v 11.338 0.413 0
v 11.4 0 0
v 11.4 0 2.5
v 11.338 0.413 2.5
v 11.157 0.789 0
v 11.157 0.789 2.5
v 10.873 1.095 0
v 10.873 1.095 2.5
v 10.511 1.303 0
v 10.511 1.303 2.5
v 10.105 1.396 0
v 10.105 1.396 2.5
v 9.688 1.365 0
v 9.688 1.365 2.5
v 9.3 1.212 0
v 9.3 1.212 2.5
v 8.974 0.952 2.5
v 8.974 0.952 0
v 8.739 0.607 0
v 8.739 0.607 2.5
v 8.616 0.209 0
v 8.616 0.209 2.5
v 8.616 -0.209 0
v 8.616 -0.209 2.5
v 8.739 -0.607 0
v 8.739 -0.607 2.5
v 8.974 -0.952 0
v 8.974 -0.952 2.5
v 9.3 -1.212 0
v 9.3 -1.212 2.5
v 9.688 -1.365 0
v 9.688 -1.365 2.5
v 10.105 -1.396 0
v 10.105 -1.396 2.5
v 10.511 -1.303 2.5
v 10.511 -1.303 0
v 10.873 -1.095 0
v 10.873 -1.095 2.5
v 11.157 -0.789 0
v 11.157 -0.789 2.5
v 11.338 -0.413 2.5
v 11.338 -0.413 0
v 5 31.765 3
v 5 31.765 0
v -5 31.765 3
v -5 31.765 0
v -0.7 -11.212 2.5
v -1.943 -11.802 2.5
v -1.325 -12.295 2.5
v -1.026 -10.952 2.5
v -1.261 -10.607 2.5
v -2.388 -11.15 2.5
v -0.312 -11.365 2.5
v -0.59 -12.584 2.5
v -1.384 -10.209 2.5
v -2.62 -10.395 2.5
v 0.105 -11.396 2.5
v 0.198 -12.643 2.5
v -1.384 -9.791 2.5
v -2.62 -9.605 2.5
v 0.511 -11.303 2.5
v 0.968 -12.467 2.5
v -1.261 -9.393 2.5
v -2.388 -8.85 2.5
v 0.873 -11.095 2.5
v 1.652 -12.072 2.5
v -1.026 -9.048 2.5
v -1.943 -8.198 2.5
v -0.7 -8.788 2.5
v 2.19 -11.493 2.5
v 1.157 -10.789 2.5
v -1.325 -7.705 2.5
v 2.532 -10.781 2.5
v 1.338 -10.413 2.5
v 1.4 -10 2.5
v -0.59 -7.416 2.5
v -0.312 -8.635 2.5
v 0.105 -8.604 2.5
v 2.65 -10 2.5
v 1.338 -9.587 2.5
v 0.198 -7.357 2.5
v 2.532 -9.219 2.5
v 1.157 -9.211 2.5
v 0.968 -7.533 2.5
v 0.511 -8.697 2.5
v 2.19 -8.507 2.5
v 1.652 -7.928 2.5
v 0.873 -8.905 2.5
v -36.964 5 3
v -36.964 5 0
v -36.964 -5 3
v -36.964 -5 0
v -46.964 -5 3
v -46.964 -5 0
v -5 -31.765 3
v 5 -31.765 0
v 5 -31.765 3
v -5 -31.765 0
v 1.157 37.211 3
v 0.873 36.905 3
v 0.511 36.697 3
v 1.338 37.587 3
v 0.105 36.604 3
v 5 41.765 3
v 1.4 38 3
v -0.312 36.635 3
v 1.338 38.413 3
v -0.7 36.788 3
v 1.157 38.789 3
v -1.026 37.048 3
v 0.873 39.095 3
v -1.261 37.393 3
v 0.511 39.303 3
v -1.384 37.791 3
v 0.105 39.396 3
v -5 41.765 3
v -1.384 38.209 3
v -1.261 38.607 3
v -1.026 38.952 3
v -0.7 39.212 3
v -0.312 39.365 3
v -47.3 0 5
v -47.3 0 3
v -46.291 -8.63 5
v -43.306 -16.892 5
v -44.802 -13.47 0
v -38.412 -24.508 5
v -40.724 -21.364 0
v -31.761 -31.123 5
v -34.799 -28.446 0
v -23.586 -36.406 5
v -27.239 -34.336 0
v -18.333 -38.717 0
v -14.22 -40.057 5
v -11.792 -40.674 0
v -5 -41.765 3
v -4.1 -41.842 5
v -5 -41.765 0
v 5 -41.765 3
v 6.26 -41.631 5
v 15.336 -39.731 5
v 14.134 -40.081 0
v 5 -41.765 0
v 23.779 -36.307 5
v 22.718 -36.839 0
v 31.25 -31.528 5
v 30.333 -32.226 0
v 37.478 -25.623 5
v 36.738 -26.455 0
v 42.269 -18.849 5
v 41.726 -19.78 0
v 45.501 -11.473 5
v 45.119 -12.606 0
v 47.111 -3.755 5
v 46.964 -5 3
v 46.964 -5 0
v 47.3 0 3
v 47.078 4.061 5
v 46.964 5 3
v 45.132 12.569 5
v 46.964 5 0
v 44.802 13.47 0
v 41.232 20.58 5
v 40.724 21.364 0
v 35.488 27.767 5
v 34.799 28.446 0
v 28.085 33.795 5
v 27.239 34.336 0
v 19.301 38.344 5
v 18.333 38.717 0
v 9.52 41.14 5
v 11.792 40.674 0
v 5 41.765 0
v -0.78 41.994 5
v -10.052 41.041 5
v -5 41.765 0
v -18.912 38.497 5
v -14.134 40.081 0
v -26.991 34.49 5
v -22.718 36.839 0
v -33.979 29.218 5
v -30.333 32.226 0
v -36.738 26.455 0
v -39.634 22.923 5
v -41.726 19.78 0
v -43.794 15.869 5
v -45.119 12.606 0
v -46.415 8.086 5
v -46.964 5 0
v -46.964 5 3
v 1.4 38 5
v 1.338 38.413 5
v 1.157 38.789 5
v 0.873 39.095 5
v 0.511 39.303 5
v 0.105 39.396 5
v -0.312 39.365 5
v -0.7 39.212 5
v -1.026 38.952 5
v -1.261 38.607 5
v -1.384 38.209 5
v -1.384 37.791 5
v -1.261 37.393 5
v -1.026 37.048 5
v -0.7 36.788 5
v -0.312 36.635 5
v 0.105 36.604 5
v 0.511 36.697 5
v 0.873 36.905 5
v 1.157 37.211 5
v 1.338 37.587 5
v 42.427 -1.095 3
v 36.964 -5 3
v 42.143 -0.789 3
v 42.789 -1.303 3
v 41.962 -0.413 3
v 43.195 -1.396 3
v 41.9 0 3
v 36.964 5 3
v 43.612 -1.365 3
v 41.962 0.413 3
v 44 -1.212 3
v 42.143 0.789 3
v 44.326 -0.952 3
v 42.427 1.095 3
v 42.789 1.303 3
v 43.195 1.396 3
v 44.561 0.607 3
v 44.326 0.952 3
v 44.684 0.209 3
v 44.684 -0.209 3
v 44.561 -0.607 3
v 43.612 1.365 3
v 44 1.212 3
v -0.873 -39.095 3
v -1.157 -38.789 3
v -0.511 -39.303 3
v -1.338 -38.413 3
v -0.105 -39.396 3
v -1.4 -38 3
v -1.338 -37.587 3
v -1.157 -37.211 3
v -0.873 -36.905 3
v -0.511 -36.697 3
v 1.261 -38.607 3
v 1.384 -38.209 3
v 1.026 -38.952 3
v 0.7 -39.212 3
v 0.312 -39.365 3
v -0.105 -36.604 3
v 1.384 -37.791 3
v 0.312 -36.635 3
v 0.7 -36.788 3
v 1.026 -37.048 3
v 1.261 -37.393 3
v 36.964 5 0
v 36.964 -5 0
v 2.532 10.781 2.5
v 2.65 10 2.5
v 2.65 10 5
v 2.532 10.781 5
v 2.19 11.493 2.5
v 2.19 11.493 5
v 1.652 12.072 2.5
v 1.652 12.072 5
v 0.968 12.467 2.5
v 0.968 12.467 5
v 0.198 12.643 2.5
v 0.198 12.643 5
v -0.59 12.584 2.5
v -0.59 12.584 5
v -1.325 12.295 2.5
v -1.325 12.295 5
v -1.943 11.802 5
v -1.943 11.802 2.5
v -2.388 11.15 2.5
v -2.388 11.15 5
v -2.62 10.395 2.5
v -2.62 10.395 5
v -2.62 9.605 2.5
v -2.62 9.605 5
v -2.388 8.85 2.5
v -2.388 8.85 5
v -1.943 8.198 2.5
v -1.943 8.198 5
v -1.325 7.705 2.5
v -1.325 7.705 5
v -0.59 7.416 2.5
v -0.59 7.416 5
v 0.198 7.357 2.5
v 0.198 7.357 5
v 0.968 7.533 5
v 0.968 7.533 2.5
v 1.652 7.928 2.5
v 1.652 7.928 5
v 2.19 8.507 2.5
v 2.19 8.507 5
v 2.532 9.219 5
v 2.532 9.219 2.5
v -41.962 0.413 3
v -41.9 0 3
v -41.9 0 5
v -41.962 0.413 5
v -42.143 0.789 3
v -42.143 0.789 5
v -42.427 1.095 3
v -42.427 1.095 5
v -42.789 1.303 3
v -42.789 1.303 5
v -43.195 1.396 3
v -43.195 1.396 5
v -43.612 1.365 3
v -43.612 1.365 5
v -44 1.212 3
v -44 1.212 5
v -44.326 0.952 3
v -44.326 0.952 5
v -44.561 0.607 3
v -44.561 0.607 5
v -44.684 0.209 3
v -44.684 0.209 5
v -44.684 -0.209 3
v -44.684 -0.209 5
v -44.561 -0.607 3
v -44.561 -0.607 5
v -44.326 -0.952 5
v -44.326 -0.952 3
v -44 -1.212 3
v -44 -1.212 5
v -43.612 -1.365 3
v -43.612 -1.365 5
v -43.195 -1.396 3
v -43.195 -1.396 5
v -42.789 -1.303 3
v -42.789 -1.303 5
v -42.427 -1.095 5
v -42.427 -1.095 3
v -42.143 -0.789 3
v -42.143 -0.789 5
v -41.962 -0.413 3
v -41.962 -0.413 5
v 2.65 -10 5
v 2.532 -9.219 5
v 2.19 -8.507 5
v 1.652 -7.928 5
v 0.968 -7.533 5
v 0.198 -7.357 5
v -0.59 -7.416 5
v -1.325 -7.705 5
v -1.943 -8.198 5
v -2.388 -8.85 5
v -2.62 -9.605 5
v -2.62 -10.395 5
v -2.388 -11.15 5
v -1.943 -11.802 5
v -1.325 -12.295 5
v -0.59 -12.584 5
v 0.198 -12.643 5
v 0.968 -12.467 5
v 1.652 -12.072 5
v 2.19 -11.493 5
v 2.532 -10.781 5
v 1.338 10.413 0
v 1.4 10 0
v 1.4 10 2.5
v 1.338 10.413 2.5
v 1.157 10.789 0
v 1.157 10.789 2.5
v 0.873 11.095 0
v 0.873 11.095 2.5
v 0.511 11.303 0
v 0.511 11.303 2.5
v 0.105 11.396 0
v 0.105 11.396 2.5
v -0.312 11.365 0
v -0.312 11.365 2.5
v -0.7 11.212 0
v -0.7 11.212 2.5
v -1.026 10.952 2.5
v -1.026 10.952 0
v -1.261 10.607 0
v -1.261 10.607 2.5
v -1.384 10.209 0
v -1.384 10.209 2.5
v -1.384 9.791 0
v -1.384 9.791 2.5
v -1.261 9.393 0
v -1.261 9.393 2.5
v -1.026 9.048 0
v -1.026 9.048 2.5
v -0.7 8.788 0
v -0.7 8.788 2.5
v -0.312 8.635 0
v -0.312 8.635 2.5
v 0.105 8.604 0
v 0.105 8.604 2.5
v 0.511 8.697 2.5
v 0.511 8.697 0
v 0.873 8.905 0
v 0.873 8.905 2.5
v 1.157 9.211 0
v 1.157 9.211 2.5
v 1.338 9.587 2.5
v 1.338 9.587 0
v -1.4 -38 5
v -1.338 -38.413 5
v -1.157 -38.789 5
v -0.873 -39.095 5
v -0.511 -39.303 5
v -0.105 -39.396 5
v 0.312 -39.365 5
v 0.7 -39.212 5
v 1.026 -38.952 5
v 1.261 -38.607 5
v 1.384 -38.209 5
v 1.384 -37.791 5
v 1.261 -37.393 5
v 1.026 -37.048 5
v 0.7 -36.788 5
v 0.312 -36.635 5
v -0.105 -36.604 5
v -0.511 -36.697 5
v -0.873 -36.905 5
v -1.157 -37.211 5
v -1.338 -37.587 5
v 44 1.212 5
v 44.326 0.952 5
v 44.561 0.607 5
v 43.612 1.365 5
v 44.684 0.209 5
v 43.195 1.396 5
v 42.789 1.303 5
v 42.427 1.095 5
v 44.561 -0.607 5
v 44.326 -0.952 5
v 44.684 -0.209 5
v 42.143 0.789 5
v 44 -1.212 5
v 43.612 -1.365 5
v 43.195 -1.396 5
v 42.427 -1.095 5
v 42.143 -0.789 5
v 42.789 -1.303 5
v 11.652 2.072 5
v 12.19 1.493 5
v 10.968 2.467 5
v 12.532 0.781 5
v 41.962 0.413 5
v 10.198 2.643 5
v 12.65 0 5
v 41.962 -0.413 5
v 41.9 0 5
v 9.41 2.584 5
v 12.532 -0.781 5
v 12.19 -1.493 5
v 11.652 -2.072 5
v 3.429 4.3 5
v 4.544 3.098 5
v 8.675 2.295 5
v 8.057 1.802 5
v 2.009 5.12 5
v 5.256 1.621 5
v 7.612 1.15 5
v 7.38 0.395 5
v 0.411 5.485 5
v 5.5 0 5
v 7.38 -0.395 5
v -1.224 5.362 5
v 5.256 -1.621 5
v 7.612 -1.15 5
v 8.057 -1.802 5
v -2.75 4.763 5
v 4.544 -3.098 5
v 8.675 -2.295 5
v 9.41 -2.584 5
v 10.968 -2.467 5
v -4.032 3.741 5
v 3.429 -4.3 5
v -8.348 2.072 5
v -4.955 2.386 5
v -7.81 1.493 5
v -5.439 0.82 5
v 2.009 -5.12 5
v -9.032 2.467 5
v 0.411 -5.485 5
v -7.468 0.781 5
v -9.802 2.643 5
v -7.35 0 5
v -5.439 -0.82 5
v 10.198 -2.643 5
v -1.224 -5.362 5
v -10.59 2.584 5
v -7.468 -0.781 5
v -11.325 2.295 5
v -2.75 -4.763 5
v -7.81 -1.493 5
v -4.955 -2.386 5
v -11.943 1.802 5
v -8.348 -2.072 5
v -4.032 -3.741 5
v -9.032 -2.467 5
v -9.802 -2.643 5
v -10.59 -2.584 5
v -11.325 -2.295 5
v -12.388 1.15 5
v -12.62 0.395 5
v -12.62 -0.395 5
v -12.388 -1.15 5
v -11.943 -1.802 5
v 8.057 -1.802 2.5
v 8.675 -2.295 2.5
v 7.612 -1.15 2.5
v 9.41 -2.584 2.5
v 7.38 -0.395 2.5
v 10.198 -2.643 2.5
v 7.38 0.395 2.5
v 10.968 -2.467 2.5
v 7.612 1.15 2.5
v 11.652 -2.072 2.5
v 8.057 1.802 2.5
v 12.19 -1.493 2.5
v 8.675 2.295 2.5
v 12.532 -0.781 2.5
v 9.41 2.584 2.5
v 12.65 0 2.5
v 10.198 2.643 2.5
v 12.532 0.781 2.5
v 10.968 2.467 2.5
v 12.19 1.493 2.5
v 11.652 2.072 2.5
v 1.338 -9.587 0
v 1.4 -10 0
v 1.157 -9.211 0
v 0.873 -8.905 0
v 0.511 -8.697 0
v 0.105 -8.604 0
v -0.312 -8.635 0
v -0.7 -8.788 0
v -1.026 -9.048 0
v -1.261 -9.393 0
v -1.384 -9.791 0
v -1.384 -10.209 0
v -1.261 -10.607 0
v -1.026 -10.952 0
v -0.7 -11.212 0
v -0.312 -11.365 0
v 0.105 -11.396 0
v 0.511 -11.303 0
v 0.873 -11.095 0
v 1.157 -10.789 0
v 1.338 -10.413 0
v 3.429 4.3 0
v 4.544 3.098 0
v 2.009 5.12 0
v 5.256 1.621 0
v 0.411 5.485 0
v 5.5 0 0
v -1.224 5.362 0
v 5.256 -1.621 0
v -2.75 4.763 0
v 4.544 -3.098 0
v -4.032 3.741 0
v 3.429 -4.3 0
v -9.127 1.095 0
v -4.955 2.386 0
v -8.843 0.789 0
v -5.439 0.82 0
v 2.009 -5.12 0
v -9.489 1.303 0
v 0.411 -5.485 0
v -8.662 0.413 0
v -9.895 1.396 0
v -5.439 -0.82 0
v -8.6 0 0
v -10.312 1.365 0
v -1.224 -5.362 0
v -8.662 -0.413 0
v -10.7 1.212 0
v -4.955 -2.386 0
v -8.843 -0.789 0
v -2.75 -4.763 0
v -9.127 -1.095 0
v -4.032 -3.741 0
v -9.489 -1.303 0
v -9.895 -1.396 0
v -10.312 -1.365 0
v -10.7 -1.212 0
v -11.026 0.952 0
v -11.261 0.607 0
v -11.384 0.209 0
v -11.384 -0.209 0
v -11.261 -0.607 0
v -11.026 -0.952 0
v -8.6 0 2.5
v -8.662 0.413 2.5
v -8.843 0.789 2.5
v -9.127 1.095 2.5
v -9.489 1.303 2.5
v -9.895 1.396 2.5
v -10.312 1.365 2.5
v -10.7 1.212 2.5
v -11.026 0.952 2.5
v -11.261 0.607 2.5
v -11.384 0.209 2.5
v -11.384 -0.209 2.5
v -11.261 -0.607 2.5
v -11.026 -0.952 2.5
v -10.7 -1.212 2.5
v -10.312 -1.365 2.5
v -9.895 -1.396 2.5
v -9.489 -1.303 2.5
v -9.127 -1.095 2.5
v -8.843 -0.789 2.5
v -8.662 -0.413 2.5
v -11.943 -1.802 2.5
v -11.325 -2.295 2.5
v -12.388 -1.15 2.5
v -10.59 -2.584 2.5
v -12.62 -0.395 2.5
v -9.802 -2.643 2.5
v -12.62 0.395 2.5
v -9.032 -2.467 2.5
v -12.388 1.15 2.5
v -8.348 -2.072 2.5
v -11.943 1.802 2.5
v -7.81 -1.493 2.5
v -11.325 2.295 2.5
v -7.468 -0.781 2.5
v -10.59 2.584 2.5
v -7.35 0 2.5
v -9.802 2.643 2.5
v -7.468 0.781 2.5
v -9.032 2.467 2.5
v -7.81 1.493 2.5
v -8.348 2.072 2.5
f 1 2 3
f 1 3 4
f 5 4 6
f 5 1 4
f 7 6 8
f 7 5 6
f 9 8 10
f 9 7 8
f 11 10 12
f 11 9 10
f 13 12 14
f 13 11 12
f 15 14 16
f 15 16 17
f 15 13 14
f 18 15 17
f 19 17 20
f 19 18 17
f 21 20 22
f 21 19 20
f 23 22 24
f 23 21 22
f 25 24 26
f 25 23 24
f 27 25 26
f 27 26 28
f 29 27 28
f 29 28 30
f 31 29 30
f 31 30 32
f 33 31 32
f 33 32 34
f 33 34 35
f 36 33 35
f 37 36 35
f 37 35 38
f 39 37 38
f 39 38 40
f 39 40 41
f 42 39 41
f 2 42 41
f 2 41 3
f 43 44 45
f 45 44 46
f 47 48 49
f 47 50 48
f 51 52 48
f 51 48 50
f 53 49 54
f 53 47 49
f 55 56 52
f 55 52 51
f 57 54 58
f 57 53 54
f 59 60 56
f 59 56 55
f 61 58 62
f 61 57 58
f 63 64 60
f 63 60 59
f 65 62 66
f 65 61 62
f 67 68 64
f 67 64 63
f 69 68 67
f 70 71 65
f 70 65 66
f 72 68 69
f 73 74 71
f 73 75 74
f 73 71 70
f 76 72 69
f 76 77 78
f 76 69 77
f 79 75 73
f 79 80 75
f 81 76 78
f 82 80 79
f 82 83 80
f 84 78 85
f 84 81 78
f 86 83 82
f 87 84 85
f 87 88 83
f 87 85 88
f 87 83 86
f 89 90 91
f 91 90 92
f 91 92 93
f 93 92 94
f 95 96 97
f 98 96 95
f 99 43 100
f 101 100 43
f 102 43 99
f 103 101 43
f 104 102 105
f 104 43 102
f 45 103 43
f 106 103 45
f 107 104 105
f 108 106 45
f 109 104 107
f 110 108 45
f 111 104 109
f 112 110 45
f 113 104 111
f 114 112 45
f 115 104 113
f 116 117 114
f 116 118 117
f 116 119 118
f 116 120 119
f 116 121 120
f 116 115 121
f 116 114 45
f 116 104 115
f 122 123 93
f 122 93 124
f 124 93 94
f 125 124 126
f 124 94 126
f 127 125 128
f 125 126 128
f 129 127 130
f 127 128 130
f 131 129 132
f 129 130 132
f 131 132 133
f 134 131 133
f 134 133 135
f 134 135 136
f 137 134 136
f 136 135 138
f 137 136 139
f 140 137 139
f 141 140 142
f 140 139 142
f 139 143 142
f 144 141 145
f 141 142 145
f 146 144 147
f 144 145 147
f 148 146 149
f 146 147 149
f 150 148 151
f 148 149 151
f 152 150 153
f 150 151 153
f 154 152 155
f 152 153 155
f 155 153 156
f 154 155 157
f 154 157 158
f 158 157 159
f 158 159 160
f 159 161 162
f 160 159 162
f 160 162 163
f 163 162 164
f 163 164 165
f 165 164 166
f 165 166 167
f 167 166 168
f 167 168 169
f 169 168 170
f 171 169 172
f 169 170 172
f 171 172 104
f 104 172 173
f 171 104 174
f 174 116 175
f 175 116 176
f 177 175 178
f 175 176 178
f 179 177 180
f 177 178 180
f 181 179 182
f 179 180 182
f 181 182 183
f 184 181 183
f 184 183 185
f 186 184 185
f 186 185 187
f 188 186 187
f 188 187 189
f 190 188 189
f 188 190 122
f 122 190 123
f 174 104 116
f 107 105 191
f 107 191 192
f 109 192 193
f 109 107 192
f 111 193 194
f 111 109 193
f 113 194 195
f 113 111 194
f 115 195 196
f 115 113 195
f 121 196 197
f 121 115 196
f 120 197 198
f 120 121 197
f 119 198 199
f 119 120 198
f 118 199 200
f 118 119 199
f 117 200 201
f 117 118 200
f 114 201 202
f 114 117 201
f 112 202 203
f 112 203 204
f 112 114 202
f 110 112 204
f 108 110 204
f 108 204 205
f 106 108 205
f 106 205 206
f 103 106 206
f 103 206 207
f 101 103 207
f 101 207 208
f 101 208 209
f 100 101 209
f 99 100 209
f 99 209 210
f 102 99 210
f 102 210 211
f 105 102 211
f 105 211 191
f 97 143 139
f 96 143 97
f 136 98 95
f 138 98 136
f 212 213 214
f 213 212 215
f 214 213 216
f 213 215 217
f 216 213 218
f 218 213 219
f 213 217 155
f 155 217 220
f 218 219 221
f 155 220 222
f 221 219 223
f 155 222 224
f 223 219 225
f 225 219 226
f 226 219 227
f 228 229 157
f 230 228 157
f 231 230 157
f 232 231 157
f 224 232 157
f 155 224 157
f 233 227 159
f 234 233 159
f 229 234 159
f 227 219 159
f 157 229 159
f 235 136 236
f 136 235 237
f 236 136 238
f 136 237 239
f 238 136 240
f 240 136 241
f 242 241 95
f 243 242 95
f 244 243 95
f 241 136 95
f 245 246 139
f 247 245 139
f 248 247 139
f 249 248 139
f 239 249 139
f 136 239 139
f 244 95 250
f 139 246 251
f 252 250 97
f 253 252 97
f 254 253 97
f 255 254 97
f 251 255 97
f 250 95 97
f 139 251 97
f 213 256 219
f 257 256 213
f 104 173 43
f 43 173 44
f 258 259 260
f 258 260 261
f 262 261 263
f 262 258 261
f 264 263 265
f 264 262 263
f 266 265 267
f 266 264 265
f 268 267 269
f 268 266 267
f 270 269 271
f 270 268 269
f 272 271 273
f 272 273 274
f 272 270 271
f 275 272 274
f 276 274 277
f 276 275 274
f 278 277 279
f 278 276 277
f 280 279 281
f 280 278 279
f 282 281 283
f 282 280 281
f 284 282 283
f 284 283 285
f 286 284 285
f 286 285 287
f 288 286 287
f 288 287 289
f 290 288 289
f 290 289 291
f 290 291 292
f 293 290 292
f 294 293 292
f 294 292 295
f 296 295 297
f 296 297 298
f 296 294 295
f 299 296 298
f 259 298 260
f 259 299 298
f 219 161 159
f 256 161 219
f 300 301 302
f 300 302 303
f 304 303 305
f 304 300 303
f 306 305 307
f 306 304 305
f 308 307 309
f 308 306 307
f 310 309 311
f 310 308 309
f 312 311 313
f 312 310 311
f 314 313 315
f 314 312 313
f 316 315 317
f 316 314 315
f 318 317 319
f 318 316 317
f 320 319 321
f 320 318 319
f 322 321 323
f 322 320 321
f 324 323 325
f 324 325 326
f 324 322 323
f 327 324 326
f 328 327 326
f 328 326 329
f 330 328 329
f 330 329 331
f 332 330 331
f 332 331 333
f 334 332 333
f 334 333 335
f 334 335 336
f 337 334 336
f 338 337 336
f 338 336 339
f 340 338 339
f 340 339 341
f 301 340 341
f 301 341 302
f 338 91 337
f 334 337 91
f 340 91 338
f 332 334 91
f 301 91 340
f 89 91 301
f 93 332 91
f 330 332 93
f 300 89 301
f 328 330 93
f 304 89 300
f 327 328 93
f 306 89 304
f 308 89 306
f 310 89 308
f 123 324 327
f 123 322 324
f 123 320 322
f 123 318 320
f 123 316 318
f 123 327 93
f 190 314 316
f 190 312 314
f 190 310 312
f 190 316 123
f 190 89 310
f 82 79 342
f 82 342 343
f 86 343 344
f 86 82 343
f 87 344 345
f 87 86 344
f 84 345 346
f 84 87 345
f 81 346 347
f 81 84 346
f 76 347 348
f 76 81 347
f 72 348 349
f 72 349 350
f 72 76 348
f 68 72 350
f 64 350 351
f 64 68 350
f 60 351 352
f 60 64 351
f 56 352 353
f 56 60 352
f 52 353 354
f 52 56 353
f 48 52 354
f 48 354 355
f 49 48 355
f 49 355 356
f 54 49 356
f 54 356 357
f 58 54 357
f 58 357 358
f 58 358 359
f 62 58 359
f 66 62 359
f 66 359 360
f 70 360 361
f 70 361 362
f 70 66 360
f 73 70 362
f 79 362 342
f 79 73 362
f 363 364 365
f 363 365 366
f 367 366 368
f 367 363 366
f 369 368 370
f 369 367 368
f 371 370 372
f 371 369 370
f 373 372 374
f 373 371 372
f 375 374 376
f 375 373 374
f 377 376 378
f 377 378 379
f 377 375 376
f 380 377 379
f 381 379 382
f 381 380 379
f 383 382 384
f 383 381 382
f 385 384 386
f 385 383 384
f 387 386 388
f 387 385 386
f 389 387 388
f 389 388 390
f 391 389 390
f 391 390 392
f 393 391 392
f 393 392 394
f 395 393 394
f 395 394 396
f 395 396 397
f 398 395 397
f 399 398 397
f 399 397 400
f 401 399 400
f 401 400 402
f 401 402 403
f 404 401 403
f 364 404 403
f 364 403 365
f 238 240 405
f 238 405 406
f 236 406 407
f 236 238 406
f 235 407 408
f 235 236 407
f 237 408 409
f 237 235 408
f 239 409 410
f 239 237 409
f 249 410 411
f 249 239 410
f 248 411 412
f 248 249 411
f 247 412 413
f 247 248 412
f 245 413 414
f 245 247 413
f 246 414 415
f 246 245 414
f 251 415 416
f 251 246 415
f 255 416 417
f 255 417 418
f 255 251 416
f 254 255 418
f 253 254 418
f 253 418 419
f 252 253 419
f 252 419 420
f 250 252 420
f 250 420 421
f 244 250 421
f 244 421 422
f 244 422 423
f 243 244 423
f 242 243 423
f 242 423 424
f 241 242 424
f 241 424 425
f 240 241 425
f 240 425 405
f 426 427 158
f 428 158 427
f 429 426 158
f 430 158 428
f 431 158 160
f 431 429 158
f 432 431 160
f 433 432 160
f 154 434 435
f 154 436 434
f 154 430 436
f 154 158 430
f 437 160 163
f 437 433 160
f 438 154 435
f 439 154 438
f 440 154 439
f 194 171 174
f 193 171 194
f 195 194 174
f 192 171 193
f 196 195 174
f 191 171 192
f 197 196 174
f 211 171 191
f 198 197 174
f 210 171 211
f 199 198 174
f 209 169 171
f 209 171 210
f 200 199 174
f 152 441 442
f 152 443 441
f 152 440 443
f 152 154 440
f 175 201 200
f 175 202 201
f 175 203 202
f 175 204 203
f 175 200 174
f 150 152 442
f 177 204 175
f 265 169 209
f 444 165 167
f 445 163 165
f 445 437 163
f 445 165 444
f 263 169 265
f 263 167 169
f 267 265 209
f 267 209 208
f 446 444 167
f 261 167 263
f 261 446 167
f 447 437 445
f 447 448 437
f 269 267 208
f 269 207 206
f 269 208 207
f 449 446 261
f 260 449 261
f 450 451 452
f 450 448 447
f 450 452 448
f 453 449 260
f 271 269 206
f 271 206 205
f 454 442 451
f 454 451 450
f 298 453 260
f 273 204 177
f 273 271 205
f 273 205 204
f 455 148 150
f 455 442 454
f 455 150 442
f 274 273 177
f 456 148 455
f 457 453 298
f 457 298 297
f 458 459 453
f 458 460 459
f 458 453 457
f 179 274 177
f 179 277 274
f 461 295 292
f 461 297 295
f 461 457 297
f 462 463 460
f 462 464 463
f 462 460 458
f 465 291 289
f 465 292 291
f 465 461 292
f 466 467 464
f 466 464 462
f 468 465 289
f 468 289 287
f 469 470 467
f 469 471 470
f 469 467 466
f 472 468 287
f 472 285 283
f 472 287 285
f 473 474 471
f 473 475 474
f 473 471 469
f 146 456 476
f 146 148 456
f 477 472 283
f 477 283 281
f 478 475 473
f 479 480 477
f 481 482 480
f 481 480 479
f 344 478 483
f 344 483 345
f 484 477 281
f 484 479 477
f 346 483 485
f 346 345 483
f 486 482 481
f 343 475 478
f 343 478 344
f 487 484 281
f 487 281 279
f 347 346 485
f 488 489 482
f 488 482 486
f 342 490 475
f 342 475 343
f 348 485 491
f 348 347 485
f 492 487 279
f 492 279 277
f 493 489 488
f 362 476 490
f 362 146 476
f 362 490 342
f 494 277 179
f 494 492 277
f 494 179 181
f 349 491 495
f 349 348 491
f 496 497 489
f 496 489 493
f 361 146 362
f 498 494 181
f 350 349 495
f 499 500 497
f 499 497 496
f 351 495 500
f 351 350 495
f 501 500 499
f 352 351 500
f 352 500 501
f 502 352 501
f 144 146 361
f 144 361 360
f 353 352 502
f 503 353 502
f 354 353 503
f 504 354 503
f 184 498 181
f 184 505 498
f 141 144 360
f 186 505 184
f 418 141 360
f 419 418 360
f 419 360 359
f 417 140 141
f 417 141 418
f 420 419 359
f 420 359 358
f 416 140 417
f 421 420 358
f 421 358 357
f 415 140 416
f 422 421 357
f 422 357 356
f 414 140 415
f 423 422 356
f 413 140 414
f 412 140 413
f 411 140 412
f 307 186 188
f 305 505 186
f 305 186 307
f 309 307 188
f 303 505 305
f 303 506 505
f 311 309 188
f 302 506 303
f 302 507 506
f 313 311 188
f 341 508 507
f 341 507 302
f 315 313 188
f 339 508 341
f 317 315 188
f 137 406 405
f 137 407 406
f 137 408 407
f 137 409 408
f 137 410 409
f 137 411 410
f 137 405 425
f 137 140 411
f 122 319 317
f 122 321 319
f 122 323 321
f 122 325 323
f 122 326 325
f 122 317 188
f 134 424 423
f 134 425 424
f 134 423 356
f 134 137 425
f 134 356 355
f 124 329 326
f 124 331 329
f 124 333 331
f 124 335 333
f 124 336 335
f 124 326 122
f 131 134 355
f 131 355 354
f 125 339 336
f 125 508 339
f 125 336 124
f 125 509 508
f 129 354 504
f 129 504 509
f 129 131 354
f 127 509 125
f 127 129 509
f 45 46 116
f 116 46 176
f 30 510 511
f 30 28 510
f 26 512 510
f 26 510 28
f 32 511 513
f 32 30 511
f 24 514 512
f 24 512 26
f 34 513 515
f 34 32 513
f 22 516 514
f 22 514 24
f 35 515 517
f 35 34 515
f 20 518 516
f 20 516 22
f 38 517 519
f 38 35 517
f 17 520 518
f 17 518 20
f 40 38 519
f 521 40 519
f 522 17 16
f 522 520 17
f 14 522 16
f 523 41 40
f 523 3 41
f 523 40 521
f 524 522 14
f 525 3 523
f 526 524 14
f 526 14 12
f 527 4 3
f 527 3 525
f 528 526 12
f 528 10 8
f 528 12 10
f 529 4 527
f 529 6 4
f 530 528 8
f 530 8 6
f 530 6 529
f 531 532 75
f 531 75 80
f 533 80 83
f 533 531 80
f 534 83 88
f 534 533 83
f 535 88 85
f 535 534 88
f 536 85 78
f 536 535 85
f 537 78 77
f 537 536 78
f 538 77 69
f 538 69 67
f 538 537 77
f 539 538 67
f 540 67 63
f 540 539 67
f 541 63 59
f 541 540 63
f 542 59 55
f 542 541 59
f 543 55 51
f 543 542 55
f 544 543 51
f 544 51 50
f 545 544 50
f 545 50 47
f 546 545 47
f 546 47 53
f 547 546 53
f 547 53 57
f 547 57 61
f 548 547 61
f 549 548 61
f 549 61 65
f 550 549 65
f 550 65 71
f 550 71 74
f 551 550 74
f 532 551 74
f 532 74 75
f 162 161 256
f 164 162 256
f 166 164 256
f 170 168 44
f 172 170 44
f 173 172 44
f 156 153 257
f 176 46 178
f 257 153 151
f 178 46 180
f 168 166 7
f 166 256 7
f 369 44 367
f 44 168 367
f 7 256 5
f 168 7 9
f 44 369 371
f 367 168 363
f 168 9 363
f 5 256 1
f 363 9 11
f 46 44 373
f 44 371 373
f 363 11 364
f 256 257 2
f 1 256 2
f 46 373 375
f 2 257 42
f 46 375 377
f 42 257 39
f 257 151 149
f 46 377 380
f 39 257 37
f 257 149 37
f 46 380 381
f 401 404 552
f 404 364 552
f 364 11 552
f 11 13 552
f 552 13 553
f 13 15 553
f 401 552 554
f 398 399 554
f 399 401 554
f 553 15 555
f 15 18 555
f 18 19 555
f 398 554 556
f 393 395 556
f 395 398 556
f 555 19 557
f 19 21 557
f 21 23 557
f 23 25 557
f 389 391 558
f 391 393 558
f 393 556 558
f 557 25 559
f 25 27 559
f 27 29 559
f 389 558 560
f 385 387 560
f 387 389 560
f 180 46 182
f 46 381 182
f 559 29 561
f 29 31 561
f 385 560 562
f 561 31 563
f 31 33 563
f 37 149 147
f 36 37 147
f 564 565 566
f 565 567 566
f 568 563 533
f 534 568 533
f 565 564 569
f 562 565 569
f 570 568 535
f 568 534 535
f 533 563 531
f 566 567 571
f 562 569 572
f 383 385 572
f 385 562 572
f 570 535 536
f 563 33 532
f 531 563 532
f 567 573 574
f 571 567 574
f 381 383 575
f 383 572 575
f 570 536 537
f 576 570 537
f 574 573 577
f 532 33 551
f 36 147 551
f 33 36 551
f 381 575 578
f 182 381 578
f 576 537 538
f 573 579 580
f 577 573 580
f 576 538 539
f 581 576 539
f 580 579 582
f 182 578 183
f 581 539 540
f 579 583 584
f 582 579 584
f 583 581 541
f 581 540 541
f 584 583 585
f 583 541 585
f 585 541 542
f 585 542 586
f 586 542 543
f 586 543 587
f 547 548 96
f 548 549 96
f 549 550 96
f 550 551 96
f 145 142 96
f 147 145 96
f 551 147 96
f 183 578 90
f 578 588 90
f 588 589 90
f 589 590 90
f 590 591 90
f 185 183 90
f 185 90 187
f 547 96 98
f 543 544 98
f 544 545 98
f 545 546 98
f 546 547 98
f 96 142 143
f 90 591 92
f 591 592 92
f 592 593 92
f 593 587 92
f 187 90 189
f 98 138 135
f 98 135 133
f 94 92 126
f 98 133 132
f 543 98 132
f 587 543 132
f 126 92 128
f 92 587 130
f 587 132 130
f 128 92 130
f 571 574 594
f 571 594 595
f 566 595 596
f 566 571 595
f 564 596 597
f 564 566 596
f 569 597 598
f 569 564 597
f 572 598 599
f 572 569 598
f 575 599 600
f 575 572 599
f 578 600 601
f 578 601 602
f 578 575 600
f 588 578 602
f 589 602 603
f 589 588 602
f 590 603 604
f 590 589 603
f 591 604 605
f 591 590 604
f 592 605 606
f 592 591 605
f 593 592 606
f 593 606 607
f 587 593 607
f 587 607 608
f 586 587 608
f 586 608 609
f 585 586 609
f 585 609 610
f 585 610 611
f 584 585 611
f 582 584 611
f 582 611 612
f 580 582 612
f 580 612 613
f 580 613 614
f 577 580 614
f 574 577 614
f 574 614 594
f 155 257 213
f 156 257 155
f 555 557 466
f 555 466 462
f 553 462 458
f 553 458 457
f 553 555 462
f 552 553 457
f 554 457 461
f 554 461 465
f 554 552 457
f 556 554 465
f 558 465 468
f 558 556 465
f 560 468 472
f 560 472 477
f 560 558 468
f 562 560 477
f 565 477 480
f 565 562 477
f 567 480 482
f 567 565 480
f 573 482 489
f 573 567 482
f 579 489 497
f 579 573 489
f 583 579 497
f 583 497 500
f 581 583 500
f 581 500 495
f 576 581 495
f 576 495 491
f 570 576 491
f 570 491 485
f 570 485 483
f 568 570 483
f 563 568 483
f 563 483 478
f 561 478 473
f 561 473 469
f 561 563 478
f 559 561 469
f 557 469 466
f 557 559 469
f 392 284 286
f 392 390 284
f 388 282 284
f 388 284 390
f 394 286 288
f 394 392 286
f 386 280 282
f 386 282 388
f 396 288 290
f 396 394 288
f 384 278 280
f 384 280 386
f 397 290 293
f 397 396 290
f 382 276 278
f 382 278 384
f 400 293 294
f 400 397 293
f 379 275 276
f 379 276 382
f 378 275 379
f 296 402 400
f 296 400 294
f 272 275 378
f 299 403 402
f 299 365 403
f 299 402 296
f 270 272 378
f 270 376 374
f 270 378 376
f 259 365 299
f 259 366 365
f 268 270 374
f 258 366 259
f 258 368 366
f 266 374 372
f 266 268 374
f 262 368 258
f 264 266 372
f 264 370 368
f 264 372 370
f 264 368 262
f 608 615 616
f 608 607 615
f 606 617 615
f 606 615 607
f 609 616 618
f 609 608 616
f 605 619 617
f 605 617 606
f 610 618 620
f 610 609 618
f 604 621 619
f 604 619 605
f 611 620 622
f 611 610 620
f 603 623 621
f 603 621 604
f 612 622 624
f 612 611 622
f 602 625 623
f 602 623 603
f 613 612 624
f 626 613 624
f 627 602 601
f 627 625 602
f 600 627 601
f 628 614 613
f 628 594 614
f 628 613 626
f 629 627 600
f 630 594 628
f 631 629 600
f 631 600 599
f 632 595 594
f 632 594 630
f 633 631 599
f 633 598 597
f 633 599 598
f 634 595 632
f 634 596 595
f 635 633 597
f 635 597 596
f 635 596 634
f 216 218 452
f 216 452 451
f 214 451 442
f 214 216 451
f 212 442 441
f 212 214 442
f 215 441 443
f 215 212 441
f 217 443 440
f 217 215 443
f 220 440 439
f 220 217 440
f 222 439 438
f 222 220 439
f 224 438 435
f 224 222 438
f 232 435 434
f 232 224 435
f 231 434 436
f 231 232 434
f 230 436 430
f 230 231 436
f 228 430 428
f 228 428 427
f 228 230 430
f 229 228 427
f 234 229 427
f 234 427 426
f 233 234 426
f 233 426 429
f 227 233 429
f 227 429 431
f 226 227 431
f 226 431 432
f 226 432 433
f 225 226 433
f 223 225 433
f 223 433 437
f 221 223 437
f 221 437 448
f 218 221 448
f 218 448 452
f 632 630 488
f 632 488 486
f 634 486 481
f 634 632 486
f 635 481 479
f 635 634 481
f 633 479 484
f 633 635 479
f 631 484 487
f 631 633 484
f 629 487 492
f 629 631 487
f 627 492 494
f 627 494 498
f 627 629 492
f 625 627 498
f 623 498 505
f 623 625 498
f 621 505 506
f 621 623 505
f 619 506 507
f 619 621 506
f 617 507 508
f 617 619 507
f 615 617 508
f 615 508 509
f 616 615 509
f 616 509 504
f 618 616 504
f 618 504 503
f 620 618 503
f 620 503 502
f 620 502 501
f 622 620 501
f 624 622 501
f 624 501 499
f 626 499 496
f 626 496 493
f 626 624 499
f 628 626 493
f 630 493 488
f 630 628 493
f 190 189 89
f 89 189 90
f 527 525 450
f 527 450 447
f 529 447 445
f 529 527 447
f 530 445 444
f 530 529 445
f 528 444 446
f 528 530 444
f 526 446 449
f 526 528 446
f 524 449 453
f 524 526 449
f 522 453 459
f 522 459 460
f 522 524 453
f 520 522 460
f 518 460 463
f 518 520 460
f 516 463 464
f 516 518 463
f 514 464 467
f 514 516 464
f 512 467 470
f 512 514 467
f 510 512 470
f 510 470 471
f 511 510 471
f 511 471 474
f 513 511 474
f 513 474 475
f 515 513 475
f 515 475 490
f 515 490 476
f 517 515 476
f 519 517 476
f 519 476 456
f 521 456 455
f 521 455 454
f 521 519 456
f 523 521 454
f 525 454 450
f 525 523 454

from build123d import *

# Parameters (mm, degrees)
SKETCH1_RX          = 47.3
SKETCH1_RY          = 42
SKETCH1_R           = 5.5
SKETCH1_R_2         = 1.4
BOSS_EXTRUDE1_DEPTH = 5
CUT_EXTRUDE3_START  = -2.5
SKETCH5_R           = 2.65
SKETCH5_R_2         = 1.4
CUT_EXTRUDE3_DEPTH  = 2.5
CUT_EXTRUDE4_DEPTH  = 3


with BuildPart() as part:
    # Sketch1 → Boss-Extrude1 (new body)
    with BuildSketch(Plane.XY):
        with Locations(Location((0, 0), (0, 0, 180))):
            Ellipse(SKETCH1_RX, SKETCH1_RY)
        Circle(SKETCH1_R, mode=Mode.SUBTRACT)
        with Locations((-10, 0)):
            Circle(SKETCH1_R_2, mode=Mode.SUBTRACT)
        with Locations((0, 10)):
            Circle(SKETCH1_R_2, mode=Mode.SUBTRACT)
        with Locations((10, 0)):
            Circle(SKETCH1_R_2, mode=Mode.SUBTRACT)
        with Locations((0, -10)):
            Circle(SKETCH1_R_2, mode=Mode.SUBTRACT)
        with Locations((0, 38)):
            Circle(SKETCH1_R_2, mode=Mode.SUBTRACT)
        with Locations((-43.3, 0)):
            Circle(SKETCH1_R_2, mode=Mode.SUBTRACT)
        with Locations(Location((43.3, 0, 0), (0, 0, 180))):
            Circle(SKETCH1_R_2, mode=Mode.SUBTRACT)
        with Locations(Location((0, -38, 0), (0, 0, 180))):
            Circle(SKETCH1_R_2, mode=Mode.SUBTRACT)
    extrude(amount=BOSS_EXTRUDE1_DEPTH)

    # Sketch5 → Cut-Extrude3 (cut)
    # profile 1 of 4: a face of its own
    with BuildSketch(Plane.XY.offset(5).offset(CUT_EXTRUDE3_START)):
        with Locations((0, 10)):
            Circle(SKETCH5_R)
        with Locations((0, 10)):
            Circle(SKETCH5_R_2, mode=Mode.SUBTRACT)
    # profile 2 of 4: a face of its own
    with BuildSketch(Plane.XY.offset(5).offset(CUT_EXTRUDE3_START)):
        with Locations((10, 0)):
            Circle(SKETCH5_R)
        with Locations((10, 0)):
            Circle(SKETCH5_R_2, mode=Mode.SUBTRACT)
    # profile 3 of 4: a face of its own
    with BuildSketch(Plane.XY.offset(5).offset(CUT_EXTRUDE3_START)):
        with Locations((0, -10)):
            Circle(SKETCH5_R)
        with Locations((0, -10)):
            Circle(SKETCH5_R_2, mode=Mode.SUBTRACT)
    # profile 4 of 4: a face of its own
    with BuildSketch(Plane.XY.offset(5).offset(CUT_EXTRUDE3_START)):
        with Locations((-10, 0)):
            Circle(SKETCH5_R)
        with Locations((-10, 0)):
            Circle(SKETCH5_R_2, mode=Mode.SUBTRACT)
    extrude(amount=CUT_EXTRUDE3_DEPTH, mode=Mode.SUBTRACT)

    # Sketch6 → Cut-Extrude4 (cut)
    with BuildSketch(Plane(origin=(0, 0, 0), x_dir=(-1, 0, 0), z_dir=(0, 0, -1))):
        with BuildLine():
            Line((-5, 41.764681883), (-5, 31.764681883))
            Line((-5, 31.764681883), (5, 31.764681883))
            Line((5, 31.764681883), (5, 41.764681883))
            add(Edge.make_bspline(
                [(5, 41.764681883), (0, 42.236643989), (-5, 41.764681883)],
                knots=[1.464890217, 1.464890217, 1.464890217, 1.676702437, 1.676702437, 1.676702437], degree=2, weights=[1, 0.994397188, 1]))
        make_face()
        with BuildLine():
            Line((-46.963628217, 5), (-36.963628217, 5))
            Line((-36.963628217, 5), (-36.963628217, -5))
            Line((-36.963628217, -5), (-46.963628217, -5))
            add(Edge.make_bspline(
                [(-46.963628217, 5), (-47.638781009, 0), (-46.963628217, -5)],
                knots=[3.022262029, 3.022262029, 3.022262029, 3.260923278, 3.260923278, 3.260923278], degree=2, weights=[1, 0.992888546, 1]))
        make_face()
        with BuildLine():
            Line((46.963628217, 5), (36.963628217, 5))
            Line((36.963628217, 5), (36.963628217, -5))
            Line((36.963628217, -5), (46.963628217, -5))
            add(Edge.make_bspline(
                [(46.963628217, -5), (47.638781009, 0), (46.963628217, 5)],
                knots=[3.022262029, 3.022262029, 3.022262029, 3.260923278, 3.260923278, 3.260923278], degree=2, weights=[1, 0.992888546, 1]))
        make_face()
        with BuildLine():
            Line((5, -31.764681883), (5, -41.764681883))
            add(Edge.make_bspline(
                [(-5, -41.764681883), (0, -42.236643989), (5, -41.764681883)],
                knots=[4.60648287, 4.60648287, 4.60648287, 4.81829509, 4.81829509, 4.81829509], degree=2, weights=[1, 0.994397188, 1]))
            Line((-5, -41.764681883), (-5, -31.764681883))
            Line((-5, -31.764681883), (5, -31.764681883))
        make_face()
    extrude(amount=-CUT_EXTRUDE4_DEPTH, mode=Mode.SUBTRACT)


solid = part.part
